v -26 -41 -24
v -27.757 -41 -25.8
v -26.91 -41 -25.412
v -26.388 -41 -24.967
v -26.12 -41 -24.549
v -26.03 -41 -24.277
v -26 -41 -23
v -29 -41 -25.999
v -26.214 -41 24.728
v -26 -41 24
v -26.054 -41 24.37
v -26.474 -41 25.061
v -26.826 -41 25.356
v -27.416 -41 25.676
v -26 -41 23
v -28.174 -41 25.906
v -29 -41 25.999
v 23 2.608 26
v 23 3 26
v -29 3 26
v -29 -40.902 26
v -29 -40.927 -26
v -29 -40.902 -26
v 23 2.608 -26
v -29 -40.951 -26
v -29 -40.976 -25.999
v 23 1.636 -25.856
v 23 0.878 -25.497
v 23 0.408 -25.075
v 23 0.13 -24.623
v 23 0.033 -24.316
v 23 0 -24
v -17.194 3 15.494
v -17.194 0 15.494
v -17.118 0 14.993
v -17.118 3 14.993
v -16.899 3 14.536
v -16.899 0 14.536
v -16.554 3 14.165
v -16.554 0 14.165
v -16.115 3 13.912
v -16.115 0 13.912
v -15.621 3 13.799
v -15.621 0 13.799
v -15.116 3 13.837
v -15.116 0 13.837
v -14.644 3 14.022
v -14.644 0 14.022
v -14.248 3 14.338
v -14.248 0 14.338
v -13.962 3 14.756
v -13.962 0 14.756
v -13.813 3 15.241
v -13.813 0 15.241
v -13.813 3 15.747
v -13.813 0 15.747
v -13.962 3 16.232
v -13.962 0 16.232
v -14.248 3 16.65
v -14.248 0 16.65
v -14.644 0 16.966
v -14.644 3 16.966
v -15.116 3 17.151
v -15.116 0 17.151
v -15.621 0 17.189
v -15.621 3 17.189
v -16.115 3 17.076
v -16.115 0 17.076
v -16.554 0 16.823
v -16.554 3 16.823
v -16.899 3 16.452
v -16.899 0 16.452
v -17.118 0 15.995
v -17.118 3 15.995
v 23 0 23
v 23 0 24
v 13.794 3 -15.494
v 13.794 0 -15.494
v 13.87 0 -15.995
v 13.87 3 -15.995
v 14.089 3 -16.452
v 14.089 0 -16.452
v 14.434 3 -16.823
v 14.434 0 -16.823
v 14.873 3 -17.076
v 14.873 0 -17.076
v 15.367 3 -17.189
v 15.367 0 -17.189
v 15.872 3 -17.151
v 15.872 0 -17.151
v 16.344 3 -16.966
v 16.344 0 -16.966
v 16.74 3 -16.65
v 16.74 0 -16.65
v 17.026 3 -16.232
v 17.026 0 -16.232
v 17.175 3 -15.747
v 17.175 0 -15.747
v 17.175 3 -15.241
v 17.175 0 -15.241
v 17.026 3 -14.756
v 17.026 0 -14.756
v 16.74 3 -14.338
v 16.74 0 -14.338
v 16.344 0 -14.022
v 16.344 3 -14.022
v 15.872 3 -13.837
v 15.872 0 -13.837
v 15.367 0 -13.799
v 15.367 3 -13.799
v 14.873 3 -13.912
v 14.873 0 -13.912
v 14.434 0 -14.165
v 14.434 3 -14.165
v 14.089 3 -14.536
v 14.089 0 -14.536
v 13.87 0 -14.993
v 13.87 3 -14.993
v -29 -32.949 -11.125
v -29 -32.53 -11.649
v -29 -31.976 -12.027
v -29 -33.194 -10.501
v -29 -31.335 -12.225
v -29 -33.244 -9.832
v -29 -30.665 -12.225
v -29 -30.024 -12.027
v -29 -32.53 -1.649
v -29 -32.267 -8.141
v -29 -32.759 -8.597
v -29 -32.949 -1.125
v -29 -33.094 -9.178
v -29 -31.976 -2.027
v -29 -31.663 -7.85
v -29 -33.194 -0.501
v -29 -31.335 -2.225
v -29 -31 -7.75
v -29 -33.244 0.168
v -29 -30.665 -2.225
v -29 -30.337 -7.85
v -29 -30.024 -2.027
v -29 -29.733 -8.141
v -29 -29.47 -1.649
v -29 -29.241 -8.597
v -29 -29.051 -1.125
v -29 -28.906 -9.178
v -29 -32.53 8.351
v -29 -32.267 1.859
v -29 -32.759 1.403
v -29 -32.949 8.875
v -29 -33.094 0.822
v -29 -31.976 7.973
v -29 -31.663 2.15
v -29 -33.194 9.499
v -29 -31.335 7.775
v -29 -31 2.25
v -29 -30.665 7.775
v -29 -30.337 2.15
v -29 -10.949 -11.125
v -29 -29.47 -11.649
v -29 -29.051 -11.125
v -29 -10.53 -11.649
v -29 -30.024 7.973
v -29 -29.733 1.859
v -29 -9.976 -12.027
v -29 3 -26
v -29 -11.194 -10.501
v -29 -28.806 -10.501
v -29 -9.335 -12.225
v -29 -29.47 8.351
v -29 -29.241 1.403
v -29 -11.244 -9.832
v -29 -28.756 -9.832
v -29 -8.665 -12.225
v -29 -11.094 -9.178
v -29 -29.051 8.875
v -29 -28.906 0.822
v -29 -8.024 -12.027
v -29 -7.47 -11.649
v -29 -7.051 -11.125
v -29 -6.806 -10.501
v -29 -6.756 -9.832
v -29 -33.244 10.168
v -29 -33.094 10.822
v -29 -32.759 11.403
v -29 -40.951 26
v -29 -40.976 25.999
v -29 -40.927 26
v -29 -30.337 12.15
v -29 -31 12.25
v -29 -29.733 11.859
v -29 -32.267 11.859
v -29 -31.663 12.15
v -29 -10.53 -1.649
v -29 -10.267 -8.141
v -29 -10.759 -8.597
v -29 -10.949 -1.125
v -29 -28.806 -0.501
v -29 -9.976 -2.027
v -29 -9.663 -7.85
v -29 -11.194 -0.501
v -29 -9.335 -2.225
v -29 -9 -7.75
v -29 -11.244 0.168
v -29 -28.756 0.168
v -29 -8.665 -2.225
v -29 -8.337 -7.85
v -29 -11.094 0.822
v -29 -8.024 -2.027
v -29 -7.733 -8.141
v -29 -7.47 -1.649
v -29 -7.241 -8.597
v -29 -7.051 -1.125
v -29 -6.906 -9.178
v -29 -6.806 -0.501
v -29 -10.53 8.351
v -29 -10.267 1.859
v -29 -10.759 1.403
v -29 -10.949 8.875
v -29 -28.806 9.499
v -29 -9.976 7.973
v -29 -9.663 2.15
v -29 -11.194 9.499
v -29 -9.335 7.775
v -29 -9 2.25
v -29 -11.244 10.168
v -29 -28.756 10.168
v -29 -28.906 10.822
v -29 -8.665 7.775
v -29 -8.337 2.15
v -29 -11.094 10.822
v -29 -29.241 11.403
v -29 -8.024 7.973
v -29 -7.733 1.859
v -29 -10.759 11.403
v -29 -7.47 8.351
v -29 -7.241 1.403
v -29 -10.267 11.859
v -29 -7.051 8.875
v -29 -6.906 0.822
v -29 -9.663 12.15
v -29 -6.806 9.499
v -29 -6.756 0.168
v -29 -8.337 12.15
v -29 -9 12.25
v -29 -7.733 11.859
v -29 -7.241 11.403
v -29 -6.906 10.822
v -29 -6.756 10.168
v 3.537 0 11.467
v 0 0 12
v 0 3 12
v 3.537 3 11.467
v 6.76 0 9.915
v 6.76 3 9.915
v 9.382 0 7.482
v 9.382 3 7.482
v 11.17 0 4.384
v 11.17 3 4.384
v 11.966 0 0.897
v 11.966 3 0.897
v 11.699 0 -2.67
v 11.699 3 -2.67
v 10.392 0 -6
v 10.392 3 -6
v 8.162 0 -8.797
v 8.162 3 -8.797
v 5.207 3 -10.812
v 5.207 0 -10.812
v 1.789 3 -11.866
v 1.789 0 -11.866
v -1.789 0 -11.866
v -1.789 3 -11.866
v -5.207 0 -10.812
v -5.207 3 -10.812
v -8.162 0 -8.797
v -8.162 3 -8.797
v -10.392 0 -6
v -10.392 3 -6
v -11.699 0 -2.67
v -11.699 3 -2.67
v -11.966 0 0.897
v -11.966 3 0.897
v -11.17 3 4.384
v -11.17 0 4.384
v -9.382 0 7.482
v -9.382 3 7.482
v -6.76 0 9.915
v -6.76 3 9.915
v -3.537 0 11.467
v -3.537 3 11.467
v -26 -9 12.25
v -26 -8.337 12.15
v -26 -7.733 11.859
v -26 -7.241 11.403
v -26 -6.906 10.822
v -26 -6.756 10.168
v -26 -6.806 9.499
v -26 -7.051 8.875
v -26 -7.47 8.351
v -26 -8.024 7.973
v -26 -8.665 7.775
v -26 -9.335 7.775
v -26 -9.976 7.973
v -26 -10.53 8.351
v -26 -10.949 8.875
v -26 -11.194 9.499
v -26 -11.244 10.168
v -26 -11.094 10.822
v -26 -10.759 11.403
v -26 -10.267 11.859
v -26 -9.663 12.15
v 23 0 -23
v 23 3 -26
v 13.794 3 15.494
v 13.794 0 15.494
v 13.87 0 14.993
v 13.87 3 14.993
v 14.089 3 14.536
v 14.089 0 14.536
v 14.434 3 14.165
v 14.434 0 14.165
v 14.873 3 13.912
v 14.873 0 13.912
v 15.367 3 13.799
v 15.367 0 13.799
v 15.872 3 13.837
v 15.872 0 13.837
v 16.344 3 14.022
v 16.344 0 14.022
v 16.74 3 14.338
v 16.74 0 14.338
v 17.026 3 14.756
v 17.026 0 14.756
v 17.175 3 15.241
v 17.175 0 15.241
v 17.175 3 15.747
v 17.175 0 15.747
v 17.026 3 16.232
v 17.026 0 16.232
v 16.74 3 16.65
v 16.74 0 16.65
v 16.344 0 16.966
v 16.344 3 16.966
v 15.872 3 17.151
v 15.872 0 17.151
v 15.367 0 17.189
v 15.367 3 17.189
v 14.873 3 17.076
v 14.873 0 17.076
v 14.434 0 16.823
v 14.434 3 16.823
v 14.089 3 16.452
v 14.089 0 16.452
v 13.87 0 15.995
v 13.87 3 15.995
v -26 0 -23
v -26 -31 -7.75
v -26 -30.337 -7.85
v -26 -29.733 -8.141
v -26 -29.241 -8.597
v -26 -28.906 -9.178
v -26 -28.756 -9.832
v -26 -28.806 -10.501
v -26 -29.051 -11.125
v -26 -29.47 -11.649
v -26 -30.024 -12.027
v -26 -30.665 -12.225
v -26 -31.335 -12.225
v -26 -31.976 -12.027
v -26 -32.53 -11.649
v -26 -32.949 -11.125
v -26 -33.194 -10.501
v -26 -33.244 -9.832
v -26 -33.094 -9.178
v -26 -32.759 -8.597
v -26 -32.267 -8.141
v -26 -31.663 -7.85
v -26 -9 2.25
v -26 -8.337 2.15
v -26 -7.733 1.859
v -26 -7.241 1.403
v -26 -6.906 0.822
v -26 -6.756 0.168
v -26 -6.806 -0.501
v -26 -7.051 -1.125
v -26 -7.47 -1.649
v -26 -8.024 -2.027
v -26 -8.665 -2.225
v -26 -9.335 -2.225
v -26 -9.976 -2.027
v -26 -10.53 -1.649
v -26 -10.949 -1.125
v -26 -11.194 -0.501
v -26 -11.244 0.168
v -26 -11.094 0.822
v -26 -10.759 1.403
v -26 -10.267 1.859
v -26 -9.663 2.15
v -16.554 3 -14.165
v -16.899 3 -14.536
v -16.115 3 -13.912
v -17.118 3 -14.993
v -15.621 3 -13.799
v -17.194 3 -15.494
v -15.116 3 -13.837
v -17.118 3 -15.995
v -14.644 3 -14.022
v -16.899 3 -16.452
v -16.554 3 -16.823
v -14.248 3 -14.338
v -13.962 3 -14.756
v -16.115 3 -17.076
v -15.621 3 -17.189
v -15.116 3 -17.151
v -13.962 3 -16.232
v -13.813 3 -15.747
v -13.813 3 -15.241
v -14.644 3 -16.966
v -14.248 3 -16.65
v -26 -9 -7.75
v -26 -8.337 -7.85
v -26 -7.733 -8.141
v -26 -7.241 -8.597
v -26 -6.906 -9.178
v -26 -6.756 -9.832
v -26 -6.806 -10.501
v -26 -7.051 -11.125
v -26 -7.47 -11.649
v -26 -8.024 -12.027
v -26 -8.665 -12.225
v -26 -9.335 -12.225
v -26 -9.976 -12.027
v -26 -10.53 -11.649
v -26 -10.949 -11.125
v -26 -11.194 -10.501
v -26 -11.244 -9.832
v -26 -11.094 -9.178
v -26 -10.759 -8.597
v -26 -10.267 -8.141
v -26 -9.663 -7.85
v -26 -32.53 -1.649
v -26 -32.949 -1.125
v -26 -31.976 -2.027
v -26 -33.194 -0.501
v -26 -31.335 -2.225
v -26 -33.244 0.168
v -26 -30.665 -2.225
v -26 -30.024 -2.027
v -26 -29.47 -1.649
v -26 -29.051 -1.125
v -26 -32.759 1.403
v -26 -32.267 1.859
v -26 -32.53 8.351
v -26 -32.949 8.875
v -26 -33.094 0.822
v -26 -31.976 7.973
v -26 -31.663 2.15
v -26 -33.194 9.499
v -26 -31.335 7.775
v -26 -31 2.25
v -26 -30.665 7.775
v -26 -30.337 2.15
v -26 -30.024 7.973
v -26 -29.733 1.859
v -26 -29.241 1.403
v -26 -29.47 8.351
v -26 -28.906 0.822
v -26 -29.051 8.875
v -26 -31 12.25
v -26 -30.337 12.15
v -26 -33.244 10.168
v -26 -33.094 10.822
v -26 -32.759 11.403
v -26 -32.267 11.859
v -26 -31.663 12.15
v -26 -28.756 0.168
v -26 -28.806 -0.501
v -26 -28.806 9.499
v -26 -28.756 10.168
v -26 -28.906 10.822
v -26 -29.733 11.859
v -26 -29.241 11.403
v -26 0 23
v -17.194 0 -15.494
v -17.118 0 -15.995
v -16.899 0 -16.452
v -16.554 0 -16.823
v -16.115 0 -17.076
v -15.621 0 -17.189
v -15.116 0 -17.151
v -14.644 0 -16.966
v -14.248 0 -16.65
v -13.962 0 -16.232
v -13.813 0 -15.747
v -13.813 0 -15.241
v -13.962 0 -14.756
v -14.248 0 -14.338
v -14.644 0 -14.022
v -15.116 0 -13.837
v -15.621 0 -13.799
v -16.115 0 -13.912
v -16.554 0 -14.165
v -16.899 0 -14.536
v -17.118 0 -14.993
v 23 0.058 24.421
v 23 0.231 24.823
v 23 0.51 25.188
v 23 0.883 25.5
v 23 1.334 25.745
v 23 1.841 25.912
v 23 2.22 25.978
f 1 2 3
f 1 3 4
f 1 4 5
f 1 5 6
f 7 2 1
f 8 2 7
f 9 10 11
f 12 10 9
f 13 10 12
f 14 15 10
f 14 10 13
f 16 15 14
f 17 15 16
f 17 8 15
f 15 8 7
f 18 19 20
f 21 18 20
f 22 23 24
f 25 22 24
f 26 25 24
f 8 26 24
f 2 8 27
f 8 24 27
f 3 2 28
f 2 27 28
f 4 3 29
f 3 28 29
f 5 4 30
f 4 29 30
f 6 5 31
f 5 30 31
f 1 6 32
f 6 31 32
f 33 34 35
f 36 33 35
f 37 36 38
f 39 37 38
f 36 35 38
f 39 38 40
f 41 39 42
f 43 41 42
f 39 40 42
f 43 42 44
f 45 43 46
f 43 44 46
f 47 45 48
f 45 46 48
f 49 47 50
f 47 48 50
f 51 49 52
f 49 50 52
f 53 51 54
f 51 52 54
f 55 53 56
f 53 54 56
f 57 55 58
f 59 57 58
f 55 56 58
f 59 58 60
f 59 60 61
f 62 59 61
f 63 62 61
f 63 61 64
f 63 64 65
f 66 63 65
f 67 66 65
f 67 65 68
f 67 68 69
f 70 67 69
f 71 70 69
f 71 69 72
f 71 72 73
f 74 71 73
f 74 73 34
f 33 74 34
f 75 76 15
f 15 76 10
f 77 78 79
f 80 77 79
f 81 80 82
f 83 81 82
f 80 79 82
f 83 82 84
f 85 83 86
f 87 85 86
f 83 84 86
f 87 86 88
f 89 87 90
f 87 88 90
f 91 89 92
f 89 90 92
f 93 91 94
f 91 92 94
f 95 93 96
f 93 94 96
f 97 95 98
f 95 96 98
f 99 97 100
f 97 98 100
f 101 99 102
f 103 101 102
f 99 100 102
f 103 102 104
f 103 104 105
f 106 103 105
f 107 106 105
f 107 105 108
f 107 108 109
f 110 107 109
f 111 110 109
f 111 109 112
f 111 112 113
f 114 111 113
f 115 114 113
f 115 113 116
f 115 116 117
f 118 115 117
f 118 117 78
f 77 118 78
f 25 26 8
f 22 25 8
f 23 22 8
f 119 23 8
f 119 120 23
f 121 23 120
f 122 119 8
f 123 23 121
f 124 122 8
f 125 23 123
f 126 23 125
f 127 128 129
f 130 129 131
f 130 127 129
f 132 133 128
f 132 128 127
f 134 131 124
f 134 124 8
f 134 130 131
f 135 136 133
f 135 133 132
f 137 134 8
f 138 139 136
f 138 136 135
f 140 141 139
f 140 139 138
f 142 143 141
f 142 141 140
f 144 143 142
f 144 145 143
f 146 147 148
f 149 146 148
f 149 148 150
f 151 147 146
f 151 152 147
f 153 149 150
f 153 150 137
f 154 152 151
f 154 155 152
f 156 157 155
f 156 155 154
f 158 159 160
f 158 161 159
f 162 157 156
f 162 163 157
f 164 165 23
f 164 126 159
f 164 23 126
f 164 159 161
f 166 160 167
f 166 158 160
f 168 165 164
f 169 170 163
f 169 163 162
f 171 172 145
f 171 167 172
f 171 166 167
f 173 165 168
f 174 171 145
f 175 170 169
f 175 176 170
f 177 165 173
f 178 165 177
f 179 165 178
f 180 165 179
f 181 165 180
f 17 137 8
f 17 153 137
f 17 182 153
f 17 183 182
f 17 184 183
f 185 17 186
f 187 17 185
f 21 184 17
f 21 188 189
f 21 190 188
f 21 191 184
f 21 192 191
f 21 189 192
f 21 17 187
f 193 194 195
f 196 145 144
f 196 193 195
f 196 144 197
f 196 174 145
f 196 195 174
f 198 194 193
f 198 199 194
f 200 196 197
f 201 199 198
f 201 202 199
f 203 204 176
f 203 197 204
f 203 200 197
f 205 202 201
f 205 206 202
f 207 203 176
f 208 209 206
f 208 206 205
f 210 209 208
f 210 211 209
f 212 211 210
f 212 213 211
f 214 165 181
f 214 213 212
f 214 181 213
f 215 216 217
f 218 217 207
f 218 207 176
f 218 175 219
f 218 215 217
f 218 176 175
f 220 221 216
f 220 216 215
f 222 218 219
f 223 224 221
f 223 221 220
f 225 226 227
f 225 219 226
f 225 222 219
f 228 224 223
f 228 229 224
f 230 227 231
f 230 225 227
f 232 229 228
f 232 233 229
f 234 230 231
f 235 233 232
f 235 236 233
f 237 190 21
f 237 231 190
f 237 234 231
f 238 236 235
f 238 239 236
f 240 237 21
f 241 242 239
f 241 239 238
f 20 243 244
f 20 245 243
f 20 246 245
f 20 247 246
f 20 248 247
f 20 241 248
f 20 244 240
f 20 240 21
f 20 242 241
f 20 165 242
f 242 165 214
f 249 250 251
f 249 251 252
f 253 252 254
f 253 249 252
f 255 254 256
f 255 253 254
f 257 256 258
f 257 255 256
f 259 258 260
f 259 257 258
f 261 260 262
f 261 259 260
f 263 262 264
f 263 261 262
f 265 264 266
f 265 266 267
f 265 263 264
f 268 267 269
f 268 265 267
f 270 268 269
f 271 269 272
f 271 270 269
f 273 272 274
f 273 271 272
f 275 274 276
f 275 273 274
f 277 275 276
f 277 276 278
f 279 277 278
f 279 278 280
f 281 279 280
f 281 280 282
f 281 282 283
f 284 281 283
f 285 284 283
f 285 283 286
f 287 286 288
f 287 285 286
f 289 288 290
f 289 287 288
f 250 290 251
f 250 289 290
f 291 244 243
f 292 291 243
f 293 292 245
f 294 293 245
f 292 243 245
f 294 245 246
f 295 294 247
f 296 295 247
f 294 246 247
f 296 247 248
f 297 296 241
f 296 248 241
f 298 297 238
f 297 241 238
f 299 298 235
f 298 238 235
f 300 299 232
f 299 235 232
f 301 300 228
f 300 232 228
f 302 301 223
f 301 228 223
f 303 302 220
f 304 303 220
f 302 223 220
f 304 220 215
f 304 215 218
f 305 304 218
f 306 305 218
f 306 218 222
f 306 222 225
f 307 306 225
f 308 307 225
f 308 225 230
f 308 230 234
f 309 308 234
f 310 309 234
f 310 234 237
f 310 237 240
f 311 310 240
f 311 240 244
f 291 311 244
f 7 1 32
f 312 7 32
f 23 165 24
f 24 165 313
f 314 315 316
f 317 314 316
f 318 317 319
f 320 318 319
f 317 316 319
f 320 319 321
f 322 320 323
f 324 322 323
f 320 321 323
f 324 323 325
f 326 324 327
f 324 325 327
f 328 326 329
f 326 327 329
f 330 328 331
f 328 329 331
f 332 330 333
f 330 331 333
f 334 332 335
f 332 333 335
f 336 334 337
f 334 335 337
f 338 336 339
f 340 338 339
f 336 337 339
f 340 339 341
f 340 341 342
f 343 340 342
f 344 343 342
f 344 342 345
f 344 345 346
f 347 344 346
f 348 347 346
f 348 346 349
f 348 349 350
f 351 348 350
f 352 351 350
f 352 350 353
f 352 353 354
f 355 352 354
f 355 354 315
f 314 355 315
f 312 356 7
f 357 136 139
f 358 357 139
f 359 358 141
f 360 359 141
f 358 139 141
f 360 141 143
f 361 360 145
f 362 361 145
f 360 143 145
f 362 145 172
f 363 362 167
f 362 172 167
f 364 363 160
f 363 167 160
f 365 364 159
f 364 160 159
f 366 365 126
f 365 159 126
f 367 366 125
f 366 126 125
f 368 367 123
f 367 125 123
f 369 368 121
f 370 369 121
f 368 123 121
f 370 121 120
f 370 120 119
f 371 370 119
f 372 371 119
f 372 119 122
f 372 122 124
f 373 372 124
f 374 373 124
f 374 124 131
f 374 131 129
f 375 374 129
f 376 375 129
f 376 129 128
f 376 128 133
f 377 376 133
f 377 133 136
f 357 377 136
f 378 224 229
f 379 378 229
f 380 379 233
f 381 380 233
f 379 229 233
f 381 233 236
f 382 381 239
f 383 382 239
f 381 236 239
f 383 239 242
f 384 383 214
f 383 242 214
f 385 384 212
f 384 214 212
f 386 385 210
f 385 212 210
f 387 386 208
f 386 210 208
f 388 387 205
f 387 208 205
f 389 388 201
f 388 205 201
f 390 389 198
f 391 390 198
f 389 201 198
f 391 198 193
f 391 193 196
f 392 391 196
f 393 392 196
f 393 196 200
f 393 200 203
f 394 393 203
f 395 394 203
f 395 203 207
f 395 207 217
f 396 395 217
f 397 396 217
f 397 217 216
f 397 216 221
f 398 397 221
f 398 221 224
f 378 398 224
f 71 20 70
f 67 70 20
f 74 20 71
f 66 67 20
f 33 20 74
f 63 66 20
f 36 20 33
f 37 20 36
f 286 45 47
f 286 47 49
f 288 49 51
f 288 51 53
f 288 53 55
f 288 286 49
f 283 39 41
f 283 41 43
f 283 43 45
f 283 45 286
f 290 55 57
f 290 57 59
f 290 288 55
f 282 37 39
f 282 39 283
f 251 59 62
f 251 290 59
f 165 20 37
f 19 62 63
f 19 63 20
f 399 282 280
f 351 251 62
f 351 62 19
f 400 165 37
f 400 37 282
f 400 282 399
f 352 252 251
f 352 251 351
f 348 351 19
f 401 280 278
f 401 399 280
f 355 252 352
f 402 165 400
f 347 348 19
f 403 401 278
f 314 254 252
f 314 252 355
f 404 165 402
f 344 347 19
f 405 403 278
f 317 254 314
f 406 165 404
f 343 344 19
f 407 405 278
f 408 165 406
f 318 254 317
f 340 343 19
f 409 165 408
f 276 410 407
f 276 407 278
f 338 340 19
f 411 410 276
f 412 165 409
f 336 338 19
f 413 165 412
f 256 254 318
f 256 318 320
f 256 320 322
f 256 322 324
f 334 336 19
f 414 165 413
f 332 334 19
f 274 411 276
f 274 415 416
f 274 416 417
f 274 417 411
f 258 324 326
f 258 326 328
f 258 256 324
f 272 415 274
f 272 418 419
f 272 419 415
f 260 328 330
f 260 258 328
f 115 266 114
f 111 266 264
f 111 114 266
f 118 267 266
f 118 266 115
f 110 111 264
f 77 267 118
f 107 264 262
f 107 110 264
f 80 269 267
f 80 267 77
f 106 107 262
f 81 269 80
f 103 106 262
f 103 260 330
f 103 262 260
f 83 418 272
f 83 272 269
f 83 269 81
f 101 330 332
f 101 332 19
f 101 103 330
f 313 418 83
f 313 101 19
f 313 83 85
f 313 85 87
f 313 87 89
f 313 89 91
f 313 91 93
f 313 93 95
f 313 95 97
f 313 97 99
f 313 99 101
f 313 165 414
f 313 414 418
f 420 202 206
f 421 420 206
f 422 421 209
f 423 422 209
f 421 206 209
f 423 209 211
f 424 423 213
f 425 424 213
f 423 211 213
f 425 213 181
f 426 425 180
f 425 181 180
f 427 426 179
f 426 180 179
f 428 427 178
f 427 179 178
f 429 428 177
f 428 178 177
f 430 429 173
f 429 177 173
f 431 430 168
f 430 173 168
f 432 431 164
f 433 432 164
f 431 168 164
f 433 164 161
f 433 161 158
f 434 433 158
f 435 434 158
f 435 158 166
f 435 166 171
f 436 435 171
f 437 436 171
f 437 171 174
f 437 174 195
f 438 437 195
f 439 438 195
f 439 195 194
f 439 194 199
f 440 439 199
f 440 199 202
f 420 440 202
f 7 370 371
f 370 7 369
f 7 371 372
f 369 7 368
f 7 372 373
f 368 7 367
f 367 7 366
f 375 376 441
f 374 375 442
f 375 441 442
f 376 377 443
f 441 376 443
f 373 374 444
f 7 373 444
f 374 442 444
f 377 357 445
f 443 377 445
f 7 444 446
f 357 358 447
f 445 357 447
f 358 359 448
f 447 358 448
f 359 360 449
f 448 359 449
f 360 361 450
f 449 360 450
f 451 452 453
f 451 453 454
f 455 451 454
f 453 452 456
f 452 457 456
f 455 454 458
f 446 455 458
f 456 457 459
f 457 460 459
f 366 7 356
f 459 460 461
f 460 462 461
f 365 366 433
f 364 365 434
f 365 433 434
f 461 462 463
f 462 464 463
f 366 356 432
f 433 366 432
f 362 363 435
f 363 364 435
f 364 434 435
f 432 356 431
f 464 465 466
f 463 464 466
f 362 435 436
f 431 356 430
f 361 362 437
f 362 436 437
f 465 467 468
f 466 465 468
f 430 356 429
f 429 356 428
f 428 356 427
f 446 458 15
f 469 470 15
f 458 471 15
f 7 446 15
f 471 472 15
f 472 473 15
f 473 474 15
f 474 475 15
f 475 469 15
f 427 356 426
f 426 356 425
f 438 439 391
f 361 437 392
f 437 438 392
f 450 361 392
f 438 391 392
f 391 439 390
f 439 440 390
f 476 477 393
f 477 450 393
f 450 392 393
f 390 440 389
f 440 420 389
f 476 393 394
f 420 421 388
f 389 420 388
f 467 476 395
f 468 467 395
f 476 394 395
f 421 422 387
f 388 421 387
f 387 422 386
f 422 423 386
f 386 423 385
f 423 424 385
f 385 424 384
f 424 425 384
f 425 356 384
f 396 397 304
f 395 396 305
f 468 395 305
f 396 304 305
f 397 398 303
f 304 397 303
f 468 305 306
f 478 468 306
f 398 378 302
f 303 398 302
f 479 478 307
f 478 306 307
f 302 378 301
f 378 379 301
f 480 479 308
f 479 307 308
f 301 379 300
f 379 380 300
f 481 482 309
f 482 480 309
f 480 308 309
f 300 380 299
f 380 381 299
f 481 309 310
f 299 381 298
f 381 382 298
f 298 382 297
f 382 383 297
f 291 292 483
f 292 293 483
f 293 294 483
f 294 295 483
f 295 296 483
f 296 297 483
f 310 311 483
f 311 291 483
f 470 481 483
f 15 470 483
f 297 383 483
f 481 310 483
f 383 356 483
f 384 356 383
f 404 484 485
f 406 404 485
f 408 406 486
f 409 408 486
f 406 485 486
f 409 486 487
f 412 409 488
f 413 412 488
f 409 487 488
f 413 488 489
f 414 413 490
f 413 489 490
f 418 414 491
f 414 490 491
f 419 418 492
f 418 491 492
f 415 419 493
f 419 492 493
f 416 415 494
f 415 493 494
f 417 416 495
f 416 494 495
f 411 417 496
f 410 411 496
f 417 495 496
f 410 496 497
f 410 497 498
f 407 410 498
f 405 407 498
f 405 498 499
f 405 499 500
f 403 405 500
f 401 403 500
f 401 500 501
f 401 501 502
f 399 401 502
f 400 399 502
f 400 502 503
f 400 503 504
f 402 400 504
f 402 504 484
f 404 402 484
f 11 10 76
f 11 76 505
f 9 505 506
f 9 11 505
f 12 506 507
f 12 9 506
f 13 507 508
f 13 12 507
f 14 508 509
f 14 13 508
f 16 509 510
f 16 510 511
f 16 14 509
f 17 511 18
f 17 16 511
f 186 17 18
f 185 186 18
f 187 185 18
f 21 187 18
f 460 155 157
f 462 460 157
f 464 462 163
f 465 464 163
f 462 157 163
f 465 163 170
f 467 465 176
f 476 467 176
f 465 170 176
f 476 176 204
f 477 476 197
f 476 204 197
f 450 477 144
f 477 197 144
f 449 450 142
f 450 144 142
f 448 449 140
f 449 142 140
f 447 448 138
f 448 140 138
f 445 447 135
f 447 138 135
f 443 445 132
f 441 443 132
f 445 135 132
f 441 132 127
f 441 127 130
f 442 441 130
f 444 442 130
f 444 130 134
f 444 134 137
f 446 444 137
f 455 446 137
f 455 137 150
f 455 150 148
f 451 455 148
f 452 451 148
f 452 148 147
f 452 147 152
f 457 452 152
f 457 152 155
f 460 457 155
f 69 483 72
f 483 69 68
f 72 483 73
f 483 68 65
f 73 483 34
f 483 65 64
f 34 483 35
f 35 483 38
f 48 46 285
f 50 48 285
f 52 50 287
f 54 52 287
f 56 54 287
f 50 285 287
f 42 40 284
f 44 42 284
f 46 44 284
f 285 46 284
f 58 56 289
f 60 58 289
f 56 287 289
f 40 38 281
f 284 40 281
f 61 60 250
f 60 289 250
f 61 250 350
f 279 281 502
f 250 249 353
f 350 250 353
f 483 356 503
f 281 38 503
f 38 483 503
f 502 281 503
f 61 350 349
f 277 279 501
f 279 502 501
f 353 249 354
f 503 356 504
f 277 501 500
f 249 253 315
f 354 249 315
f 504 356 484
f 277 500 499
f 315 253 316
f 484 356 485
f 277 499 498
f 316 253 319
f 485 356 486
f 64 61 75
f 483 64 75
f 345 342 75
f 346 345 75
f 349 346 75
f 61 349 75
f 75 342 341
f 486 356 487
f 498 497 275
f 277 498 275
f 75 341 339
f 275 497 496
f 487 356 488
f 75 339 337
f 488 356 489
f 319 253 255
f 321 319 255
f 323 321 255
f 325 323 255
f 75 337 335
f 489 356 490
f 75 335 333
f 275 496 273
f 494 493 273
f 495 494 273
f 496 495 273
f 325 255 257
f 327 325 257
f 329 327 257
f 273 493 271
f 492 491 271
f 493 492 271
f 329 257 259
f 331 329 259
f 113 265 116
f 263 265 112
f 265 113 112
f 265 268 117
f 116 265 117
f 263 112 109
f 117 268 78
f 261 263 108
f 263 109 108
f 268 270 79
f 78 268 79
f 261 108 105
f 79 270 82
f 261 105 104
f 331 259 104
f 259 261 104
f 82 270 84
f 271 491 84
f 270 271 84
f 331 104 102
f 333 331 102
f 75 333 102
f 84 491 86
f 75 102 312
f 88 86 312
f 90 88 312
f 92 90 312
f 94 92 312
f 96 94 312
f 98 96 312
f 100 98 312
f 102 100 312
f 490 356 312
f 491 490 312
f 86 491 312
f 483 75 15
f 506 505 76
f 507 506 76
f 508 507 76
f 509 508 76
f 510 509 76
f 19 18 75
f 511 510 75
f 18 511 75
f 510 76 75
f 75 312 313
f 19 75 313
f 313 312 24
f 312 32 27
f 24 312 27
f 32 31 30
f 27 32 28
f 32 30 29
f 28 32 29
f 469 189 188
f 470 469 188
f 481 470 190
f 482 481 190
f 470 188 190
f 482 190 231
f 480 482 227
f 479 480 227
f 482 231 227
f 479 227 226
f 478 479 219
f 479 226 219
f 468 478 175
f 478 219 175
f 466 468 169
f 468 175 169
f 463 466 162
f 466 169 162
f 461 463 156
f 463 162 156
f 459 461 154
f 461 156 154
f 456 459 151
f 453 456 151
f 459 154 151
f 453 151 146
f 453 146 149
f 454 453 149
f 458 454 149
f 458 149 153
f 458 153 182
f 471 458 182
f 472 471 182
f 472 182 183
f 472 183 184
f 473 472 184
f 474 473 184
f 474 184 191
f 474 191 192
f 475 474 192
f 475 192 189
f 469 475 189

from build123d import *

# Parameters (mm, degrees)
SKETCH1_W            = 52
SKETCH1_H            = 52
SKETCH1_R            = 12
BOSS_EXTRUDE1_DEPTH  = 3
SKETCH2_W            = 52
SKETCH2_H            = 41
BOSS_EXTRUDE2_DEPTH  = 3
M3_CLEARANCE_HOLE1_D = 3.4
M4_CLEARANCE_HOLE1_D = 4.5
BOSS_EXTRUDE3_DEPTH  = 3
BOSS_EXTRUDE4_DEPTH  = 3
FILLET1_R            = 2


with BuildPart() as part:
    # Sketch1 → Boss-Extrude1 (new body)
    with BuildSketch(Plane(origin=(0, 0, 0), x_dir=(1, 0, 0), z_dir=(0, 1, 0))):
        with Locations((-3, 0)):
            Rectangle(SKETCH1_W, SKETCH1_H)
        with Locations(Location((0, 0, 0), (0, 0, 270))):
            Circle(SKETCH1_R, mode=Mode.SUBTRACT)
    extrude(amount=BOSS_EXTRUDE1_DEPTH)

    # Sketch2 → Boss-Extrude2 (add)
    with BuildSketch(Plane.ZY.offset(29)):
        with Locations((0, -20.5)):
            Rectangle(SKETCH2_W, SKETCH2_H)
    extrude(amount=-BOSS_EXTRUDE2_DEPTH)

    # M3 Clearance Hole1 (through all)
    with Locations(Plane(origin=(0, 3, 0), x_dir=(1, 0, 0), z_dir=(0, 1, 0))):
        with Locations((15.494, -15.494), (-15.494, -15.494), (-15.494, 15.494), (15.494, 15.494)):
            Hole(M3_CLEARANCE_HOLE1_D / 2)

    # M4 Clearance Hole1 (through all)
    with Locations(Plane(origin=(-26, 0, 0), x_dir=(0, 0, -1), z_dir=(1, 0, 0))):
        with Locations((-10, -9), (10, -9), (10, -31), (-10, -31), (0, -9), (0, -31)):
            Hole(M4_CLEARANCE_HOLE1_D / 2)

    # Sketch7 → Boss-Extrude3 (add)
    with BuildSketch(Plane(origin=(0, 0, -26), x_dir=(-1, 0, 0), z_dir=(0, 0, -1))):
        Polygon((26, -41), (-23, 0), (26, 0), align=None)
    extrude(amount=-BOSS_EXTRUDE3_DEPTH)

    # Sketch8 → Boss-Extrude4 (add)
    with BuildSketch(Plane.XY.offset(26)):
        Polygon((23, 0), (-26, -41), (-26, 0), align=None)
    extrude(amount=-BOSS_EXTRUDE4_DEPTH)

    # Fillet1
    fillet1_edges = [part.edges().sort_by_distance(p)[0] for p in [
        (-1.5, -20.5, 26),
        (-1.5, -20.5, -26),
    ]]
    fillet(fillet1_edges, radius=FILLET1_R)


solid = part.part
